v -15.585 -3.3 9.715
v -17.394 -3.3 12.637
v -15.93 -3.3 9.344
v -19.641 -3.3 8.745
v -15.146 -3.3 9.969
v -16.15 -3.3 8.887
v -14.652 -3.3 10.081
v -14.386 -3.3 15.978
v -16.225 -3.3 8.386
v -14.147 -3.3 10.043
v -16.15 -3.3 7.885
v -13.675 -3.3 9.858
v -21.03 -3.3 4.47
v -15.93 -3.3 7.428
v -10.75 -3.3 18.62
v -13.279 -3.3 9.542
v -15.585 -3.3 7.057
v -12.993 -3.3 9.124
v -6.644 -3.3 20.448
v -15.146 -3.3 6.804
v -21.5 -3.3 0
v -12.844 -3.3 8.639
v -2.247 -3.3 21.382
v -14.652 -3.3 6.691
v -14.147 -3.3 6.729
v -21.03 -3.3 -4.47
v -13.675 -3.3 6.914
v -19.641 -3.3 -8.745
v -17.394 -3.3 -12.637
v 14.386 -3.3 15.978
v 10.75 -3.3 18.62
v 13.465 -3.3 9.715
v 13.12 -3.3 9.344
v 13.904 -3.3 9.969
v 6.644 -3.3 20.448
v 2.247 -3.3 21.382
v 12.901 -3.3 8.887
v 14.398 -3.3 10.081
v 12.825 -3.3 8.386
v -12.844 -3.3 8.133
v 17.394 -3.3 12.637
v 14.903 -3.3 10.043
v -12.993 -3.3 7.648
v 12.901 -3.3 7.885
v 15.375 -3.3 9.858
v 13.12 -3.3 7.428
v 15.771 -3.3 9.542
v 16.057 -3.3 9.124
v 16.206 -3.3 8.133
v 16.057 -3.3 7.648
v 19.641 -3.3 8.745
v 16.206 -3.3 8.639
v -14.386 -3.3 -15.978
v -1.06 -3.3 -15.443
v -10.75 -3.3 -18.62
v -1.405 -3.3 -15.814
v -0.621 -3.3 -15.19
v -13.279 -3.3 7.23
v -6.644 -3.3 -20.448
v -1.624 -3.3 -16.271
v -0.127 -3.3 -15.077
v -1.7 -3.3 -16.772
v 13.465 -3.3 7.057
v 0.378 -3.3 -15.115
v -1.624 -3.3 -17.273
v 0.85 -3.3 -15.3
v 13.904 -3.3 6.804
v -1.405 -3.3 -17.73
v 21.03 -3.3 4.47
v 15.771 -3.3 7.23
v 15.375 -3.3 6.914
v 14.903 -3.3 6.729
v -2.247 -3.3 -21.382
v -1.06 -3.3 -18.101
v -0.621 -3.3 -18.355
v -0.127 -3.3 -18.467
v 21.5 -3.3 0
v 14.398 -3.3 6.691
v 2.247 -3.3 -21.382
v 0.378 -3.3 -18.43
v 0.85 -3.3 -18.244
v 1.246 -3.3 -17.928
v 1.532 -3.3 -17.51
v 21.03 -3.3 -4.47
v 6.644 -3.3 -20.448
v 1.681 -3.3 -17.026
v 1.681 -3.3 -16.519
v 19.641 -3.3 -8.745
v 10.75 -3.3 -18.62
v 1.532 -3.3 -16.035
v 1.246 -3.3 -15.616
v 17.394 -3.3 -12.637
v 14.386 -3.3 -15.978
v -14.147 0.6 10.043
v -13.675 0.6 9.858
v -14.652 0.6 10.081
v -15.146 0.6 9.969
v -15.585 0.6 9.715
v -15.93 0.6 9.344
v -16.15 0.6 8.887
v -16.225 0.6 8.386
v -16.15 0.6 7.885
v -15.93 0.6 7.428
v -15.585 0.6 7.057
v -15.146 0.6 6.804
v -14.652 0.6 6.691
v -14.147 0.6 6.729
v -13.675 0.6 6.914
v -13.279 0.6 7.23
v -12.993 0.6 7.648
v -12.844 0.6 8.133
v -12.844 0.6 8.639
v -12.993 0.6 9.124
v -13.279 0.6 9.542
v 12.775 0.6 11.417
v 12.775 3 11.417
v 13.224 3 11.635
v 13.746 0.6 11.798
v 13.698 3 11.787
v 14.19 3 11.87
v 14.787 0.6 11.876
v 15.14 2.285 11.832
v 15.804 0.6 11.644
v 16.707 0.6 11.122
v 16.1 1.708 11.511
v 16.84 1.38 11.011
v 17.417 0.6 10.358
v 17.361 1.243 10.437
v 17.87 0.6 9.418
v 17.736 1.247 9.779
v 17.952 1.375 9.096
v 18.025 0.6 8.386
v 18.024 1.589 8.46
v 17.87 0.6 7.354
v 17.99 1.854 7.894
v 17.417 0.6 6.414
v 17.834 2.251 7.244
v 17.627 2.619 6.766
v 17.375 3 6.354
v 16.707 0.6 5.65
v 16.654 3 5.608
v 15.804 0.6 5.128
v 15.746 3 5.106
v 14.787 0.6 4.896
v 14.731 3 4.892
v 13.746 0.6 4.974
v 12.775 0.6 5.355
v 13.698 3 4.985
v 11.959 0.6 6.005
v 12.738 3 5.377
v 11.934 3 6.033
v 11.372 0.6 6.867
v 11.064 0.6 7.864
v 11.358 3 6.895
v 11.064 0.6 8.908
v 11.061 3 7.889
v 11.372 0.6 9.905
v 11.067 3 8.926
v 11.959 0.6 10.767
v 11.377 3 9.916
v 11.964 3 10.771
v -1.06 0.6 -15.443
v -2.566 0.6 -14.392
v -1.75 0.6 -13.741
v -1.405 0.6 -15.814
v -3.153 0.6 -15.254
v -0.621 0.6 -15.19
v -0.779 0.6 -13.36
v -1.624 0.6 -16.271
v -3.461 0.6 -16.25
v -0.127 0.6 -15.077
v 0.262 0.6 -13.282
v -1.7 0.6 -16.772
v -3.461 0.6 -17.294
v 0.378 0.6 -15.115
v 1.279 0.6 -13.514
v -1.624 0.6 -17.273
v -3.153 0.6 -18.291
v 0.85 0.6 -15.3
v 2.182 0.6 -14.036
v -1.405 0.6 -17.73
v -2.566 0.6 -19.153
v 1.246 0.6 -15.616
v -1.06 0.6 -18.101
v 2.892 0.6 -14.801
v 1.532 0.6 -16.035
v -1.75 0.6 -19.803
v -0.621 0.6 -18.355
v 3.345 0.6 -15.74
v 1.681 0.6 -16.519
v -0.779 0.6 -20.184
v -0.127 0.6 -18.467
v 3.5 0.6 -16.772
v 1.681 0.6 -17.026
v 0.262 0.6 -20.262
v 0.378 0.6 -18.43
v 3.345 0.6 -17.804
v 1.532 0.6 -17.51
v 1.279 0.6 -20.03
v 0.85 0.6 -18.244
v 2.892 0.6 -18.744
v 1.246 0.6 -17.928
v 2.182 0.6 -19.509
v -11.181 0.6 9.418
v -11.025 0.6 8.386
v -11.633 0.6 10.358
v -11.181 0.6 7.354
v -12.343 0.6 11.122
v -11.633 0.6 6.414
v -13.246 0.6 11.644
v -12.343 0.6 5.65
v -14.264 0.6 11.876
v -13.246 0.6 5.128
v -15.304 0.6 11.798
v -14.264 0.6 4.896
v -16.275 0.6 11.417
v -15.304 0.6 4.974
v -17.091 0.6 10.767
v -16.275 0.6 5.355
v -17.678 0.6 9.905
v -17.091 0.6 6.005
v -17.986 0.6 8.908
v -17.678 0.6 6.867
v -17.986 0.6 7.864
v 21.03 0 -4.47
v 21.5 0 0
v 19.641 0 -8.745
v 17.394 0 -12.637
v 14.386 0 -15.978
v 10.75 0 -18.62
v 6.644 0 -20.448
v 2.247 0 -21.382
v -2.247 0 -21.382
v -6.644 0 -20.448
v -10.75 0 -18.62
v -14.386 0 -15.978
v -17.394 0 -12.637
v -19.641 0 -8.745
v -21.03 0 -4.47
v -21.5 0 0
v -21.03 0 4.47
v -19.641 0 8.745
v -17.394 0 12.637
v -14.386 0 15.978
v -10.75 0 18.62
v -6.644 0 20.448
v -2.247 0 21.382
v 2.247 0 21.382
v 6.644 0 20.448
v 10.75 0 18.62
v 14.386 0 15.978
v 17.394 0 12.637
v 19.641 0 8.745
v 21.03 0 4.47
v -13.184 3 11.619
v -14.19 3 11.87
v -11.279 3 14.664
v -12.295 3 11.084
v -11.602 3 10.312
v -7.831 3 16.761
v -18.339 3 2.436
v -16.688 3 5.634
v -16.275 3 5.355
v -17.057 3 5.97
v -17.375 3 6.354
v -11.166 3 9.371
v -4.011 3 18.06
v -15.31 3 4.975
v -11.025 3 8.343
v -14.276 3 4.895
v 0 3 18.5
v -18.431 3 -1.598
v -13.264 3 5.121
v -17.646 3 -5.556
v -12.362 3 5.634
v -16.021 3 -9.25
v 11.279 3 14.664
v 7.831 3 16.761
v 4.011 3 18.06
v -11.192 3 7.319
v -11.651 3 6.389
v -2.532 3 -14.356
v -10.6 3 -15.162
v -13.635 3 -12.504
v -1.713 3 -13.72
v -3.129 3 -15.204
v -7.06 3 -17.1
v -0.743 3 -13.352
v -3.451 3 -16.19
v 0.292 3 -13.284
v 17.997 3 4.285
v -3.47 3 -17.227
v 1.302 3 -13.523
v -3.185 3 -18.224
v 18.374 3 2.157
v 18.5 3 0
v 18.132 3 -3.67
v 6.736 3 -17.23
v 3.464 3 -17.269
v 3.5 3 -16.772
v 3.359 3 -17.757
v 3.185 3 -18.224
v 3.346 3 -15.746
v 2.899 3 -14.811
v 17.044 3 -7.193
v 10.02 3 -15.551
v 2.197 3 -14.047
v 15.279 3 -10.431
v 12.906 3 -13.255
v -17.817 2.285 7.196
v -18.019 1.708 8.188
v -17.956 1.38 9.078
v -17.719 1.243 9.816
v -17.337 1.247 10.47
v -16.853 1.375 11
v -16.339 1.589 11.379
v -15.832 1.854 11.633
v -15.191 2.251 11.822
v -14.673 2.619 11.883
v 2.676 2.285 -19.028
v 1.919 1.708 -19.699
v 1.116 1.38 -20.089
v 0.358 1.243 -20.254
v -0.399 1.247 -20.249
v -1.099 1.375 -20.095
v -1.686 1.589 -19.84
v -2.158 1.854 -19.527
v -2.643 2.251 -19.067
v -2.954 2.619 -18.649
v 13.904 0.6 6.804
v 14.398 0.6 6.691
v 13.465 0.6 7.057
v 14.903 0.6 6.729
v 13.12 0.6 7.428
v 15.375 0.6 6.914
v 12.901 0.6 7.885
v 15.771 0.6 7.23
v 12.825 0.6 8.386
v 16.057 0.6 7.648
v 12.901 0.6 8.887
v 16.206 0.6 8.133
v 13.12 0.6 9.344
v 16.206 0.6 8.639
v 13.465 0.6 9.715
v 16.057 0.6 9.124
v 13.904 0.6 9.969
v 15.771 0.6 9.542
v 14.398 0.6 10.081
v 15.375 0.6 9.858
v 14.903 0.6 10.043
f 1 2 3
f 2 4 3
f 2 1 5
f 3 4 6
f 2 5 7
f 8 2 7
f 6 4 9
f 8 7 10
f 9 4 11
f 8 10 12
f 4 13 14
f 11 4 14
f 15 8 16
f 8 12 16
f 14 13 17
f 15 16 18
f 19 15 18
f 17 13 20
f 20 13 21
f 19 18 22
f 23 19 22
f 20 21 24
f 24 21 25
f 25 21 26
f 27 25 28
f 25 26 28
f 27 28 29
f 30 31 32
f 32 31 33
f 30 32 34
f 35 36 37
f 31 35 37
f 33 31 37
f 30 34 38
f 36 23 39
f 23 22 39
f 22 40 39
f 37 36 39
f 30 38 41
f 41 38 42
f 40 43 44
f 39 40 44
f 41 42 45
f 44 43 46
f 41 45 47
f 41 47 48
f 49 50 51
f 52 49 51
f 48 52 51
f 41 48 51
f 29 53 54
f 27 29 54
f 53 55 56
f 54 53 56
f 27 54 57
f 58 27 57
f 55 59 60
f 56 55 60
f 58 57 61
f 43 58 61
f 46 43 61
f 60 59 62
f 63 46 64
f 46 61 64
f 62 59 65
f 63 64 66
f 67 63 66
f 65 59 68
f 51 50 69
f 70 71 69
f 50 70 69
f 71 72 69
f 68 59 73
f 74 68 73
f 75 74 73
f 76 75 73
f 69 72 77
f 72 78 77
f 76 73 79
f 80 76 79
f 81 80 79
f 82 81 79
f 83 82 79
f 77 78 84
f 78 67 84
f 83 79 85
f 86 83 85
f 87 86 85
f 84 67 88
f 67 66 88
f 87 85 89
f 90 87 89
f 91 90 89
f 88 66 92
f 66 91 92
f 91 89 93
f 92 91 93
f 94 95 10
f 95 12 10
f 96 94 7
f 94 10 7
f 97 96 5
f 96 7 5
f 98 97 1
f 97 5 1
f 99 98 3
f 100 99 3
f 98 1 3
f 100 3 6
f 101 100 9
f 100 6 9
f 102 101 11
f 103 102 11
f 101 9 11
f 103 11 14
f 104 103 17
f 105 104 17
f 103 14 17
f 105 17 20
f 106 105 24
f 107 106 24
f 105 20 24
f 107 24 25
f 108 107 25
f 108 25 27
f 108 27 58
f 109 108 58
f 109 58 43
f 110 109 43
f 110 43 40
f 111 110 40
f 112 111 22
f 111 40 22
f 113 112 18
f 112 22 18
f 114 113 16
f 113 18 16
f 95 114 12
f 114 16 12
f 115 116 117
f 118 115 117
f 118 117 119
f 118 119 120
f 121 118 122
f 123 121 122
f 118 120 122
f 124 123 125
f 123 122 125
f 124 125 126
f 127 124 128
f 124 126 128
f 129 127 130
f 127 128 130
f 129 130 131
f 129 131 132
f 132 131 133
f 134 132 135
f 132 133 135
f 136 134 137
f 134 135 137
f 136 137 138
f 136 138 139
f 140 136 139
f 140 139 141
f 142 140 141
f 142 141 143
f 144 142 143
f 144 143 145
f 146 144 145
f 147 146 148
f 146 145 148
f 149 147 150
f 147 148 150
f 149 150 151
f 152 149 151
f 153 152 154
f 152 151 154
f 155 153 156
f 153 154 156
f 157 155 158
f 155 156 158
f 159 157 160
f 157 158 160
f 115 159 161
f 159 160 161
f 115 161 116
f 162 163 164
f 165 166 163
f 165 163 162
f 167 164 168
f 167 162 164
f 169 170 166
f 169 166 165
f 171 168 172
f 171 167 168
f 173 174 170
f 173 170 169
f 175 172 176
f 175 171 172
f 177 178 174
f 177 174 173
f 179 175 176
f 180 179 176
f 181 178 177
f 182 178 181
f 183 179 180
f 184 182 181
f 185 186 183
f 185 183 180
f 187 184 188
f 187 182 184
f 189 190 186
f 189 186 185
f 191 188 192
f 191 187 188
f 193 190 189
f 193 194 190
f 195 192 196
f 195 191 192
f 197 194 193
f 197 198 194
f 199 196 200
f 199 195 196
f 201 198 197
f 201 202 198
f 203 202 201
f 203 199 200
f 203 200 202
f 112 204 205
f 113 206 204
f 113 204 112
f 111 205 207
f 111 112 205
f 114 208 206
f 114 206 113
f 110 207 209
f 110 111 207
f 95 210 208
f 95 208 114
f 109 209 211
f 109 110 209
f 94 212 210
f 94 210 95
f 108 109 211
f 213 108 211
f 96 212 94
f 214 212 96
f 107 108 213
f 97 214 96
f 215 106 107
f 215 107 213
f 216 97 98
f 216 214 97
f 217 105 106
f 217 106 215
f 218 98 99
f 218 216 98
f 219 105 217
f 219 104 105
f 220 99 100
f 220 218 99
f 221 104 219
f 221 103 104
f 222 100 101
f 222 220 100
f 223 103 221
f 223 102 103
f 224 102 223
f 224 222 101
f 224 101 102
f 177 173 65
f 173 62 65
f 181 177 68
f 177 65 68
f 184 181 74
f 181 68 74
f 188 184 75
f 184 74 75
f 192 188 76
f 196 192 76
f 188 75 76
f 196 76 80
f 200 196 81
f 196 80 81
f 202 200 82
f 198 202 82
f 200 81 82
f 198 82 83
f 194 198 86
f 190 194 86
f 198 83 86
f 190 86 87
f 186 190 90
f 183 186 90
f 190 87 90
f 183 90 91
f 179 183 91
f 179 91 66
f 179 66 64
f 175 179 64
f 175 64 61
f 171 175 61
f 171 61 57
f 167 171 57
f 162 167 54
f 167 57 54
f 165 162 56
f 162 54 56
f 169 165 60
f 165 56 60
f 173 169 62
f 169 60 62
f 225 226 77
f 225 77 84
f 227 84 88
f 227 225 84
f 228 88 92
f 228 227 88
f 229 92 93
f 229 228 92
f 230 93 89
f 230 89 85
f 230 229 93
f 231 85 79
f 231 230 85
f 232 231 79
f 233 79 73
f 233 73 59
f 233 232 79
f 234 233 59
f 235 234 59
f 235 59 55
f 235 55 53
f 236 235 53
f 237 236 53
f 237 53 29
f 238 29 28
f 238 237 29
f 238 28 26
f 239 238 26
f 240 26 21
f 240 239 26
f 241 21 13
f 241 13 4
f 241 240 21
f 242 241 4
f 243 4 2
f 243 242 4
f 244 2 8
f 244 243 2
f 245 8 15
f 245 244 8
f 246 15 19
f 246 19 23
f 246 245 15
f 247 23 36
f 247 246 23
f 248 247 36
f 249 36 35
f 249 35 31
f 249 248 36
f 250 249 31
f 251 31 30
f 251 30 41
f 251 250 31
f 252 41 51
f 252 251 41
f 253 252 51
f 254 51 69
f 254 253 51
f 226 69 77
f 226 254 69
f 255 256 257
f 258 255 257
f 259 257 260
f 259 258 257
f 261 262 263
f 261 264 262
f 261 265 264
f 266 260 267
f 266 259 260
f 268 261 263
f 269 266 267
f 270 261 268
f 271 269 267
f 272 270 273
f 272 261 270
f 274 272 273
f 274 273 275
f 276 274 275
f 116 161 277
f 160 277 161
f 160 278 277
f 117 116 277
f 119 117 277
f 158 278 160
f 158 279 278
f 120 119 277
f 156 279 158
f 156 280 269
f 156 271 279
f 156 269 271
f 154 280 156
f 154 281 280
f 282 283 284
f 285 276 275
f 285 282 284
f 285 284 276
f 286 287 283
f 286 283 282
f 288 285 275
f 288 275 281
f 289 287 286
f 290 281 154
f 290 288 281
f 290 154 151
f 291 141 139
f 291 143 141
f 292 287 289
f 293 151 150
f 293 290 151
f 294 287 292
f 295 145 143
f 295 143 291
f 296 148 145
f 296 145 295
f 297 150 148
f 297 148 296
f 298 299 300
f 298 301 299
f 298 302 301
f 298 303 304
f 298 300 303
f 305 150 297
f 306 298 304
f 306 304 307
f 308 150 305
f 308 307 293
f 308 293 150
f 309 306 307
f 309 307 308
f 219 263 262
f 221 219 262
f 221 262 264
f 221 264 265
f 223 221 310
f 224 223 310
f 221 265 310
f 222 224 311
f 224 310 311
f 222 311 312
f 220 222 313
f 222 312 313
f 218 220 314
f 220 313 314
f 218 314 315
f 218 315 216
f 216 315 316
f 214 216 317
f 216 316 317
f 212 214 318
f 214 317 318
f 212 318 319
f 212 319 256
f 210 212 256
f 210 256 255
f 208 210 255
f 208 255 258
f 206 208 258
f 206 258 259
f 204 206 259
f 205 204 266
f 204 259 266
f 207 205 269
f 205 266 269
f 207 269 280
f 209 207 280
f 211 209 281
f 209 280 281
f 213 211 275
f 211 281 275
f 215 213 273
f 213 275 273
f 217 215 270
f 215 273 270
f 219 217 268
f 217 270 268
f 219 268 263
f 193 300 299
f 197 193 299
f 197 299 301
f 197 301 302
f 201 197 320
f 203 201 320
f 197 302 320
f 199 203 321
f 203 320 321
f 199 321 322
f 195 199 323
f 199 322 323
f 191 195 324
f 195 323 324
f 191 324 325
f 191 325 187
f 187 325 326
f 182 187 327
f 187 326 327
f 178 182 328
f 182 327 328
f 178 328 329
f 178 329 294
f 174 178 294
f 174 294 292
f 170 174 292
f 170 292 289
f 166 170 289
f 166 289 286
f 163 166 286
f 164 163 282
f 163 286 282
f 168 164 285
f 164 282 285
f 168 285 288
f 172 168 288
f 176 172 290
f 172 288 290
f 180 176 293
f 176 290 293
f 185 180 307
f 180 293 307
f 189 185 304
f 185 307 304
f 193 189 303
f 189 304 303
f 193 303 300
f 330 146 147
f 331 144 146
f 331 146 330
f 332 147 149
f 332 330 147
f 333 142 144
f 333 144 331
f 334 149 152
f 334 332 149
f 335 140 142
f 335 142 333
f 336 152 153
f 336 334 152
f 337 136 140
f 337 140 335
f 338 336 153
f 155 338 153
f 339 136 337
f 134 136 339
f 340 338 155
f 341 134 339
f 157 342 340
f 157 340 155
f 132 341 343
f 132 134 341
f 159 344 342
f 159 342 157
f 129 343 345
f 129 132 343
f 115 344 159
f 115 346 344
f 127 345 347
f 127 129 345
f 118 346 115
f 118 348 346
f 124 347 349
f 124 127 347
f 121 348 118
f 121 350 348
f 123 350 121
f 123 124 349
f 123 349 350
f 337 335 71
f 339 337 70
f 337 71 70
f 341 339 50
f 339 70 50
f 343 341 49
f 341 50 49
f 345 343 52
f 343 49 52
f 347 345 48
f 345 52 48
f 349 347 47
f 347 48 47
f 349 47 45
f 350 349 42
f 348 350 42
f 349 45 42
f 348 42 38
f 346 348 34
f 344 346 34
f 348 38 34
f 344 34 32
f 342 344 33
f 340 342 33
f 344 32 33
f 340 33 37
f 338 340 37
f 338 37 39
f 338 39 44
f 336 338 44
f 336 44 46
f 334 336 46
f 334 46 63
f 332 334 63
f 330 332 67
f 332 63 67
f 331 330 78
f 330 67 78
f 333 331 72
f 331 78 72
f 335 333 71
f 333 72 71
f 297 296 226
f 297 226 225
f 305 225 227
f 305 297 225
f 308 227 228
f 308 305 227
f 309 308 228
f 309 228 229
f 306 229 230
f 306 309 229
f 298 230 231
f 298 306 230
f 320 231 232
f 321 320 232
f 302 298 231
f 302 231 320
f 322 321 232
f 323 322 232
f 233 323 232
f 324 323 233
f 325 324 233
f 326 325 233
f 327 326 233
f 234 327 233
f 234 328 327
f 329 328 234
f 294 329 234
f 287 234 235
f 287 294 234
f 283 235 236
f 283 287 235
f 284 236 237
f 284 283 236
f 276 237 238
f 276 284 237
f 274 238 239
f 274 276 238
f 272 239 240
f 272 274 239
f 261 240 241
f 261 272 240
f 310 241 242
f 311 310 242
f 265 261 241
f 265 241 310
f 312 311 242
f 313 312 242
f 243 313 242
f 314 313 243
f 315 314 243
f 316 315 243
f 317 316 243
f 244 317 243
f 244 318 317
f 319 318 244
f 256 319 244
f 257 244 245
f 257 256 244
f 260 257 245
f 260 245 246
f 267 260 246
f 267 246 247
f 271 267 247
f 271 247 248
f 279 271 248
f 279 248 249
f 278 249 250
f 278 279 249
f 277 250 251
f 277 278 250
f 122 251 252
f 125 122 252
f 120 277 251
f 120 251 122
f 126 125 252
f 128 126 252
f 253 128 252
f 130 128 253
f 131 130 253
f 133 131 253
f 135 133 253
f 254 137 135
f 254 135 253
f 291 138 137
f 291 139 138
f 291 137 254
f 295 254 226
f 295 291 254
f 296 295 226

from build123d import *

# Parameters (mm, degrees)
SZKIC2_R                                             = 21.5
DODANIE_WYCI_GNI_CIE1_DEPTH                          = 3.3
DODANIE_WYCI_GNI_CIE1_OTHER_WAY_DEPTH                = 3
DODANIE_WYCI_GNI_CIE1_OTHER_WAY_TAPER                = 45
POG_BIENIE_WALCOWE_POD_M3_WKR_T_DO_CZ_CI_D           = 3.4
POG_BIENIE_WALCOWE_POD_M3_WKR_T_DO_CZ_CI_CBORE_D     = 7
POG_BIENIE_WALCOWE_POD_M3_WKR_T_DO_CZ_CI_CBORE_DEPTH = 2.4
SZYK_KO_OWY1_COUNT                                   = 3


with BuildPart() as part:
    # Szkic2 → Dodanie-wyciągnięcie1 (new body)
    with BuildSketch(Plane(origin=(0, 0, 0), x_dir=(1, 0, 0), z_dir=(0, 1, 0))):
        Circle(SZKIC2_R)
    extrude(amount=-DODANIE_WYCI_GNI_CIE1_DEPTH)

    # Szkic2 → Dodanie-wyciągnięcie1 other way (add)
    with BuildSketch(Plane(origin=(0, 0, 0), x_dir=(1, 0, 0), z_dir=(0, 1, 0))):
        Circle(SZKIC2_R)
    extrude(amount=DODANIE_WYCI_GNI_CIE1_OTHER_WAY_DEPTH, taper=DODANIE_WYCI_GNI_CIE1_OTHER_WAY_TAPER)

    # Pogłębienie walcowe pod M3 wkręt do części metalowych z łbem stożkowym ściętym2 (through all)
    with Locations(Plane(origin=(0, 3, 0), x_dir=(1, 0, 0), z_dir=(0, 1, 0))):
        with Locations((0, 16.772140565)):
            pog_bienie_walcowe_pod_m3_wkr_t_do_cz_ci = CounterBoreHole(POG_BIENIE_WALCOWE_POD_M3_WKR_T_DO_CZ_CI_D / 2, POG_BIENIE_WALCOWE_POD_M3_WKR_T_DO_CZ_CI_CBORE_D / 2, POG_BIENIE_WALCOWE_POD_M3_WKR_T_DO_CZ_CI_CBORE_DEPTH)

    # Szyk kołowy1: Pogłębienie walcowe pod M3 wkręt do części metalowych z łbem stożkowym ściętym2 ×3 about axis
    szyk_ko_owy1_axis = Axis((0, 0, 0), (0, 1, 0))
    for i in range(1, SZYK_KO_OWY1_COUNT):
        add(pog_bienie_walcowe_pod_m3_wkr_t_do_cz_ci.rotate(szyk_ko_owy1_axis, i * 360 / SZYK_KO_OWY1_COUNT), mode=Mode.SUBTRACT)


solid = part.part
